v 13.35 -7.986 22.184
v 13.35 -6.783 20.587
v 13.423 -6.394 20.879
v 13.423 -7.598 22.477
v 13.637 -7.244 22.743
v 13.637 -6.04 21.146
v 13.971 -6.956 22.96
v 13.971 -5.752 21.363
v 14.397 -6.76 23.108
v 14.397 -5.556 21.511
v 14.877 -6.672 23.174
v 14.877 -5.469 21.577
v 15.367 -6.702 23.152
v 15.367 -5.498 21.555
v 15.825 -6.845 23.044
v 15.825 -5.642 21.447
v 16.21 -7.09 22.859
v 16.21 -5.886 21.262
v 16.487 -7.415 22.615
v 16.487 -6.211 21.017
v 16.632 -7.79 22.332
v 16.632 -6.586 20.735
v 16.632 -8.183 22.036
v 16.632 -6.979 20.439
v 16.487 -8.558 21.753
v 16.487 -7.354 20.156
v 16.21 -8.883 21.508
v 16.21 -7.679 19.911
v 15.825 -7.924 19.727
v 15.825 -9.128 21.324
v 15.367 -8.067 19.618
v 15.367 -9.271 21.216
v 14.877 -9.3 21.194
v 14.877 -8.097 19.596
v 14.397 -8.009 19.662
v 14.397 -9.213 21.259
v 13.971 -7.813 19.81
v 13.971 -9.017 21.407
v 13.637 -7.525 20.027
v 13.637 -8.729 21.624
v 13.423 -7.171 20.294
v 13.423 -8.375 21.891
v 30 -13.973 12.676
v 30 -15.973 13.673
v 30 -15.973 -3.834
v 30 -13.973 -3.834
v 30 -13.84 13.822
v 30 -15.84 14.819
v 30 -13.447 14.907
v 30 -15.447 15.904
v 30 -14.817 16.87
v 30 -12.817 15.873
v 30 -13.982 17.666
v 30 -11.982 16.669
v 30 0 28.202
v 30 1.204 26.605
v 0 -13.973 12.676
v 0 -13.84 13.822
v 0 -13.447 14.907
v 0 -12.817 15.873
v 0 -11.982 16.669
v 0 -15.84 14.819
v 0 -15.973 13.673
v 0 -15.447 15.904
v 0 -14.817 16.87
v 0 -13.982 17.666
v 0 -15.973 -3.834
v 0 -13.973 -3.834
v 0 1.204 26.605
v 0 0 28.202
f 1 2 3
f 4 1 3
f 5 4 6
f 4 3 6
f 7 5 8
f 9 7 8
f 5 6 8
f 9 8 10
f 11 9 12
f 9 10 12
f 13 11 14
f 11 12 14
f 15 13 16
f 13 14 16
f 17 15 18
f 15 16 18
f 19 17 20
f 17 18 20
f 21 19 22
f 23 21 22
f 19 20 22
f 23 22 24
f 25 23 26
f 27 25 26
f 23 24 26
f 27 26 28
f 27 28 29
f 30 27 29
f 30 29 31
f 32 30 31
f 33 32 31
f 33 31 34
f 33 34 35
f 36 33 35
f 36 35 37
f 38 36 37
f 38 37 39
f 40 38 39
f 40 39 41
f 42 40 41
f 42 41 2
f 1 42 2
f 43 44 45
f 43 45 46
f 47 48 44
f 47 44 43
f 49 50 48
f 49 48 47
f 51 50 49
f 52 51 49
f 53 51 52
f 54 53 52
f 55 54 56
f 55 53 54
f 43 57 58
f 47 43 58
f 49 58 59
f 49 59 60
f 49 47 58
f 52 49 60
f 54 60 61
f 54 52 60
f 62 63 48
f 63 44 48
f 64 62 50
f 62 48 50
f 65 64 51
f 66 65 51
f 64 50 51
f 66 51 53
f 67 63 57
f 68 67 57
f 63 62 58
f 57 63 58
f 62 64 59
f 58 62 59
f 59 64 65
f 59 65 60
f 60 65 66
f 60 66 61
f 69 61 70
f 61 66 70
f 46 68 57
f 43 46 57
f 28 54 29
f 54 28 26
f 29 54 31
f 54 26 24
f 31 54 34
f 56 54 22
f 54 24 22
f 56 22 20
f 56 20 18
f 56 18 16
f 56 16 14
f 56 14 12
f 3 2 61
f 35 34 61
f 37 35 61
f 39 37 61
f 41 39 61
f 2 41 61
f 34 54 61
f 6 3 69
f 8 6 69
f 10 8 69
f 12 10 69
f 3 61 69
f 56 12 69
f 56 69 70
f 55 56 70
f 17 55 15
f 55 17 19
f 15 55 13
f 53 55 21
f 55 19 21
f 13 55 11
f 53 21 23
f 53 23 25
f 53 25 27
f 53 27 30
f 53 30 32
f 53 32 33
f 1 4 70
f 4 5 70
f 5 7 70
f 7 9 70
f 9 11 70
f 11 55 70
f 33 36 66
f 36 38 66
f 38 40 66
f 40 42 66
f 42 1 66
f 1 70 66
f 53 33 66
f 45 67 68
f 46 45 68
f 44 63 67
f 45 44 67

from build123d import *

# Parameters (mm, degrees)
F1_DEPTH = 30
F3_D     = 3.3
F4_R     = 5


with BuildPart() as f1:
    # F0 (on Right) → F1 (new body)
    with BuildSketch(Plane.YZ):
        Polygon((-15.9727102009, 16.1656831887), (-15.9727102009, -3.8343168113), (-13.9727102009, -3.8343168113), (-13.9727102009, 15.1685199726), (1.2036300463, 26.6047126317), (0, 28.2019836518), align=None)
    extrude(amount=F1_DEPTH)

    # F3 (through all)
    with Locations(Plane(origin=(0, -13.554743317, 17.9877519272), x_dir=(1, 0, 0), z_dir=(0, -0.6018150232, 0.79863551))):
        with Locations((15, 6.9723774443)):
            Hole(F3_D / 2)

    # F4
    f4_edges = [f1.edges().sort_by_distance(p)[0] for p in [
        (15, -15.97271, 16.165683),
        (15, -13.97271, 15.16852),
    ]]
    fillet(f4_edges, radius=F4_R)


solid = f1.part
